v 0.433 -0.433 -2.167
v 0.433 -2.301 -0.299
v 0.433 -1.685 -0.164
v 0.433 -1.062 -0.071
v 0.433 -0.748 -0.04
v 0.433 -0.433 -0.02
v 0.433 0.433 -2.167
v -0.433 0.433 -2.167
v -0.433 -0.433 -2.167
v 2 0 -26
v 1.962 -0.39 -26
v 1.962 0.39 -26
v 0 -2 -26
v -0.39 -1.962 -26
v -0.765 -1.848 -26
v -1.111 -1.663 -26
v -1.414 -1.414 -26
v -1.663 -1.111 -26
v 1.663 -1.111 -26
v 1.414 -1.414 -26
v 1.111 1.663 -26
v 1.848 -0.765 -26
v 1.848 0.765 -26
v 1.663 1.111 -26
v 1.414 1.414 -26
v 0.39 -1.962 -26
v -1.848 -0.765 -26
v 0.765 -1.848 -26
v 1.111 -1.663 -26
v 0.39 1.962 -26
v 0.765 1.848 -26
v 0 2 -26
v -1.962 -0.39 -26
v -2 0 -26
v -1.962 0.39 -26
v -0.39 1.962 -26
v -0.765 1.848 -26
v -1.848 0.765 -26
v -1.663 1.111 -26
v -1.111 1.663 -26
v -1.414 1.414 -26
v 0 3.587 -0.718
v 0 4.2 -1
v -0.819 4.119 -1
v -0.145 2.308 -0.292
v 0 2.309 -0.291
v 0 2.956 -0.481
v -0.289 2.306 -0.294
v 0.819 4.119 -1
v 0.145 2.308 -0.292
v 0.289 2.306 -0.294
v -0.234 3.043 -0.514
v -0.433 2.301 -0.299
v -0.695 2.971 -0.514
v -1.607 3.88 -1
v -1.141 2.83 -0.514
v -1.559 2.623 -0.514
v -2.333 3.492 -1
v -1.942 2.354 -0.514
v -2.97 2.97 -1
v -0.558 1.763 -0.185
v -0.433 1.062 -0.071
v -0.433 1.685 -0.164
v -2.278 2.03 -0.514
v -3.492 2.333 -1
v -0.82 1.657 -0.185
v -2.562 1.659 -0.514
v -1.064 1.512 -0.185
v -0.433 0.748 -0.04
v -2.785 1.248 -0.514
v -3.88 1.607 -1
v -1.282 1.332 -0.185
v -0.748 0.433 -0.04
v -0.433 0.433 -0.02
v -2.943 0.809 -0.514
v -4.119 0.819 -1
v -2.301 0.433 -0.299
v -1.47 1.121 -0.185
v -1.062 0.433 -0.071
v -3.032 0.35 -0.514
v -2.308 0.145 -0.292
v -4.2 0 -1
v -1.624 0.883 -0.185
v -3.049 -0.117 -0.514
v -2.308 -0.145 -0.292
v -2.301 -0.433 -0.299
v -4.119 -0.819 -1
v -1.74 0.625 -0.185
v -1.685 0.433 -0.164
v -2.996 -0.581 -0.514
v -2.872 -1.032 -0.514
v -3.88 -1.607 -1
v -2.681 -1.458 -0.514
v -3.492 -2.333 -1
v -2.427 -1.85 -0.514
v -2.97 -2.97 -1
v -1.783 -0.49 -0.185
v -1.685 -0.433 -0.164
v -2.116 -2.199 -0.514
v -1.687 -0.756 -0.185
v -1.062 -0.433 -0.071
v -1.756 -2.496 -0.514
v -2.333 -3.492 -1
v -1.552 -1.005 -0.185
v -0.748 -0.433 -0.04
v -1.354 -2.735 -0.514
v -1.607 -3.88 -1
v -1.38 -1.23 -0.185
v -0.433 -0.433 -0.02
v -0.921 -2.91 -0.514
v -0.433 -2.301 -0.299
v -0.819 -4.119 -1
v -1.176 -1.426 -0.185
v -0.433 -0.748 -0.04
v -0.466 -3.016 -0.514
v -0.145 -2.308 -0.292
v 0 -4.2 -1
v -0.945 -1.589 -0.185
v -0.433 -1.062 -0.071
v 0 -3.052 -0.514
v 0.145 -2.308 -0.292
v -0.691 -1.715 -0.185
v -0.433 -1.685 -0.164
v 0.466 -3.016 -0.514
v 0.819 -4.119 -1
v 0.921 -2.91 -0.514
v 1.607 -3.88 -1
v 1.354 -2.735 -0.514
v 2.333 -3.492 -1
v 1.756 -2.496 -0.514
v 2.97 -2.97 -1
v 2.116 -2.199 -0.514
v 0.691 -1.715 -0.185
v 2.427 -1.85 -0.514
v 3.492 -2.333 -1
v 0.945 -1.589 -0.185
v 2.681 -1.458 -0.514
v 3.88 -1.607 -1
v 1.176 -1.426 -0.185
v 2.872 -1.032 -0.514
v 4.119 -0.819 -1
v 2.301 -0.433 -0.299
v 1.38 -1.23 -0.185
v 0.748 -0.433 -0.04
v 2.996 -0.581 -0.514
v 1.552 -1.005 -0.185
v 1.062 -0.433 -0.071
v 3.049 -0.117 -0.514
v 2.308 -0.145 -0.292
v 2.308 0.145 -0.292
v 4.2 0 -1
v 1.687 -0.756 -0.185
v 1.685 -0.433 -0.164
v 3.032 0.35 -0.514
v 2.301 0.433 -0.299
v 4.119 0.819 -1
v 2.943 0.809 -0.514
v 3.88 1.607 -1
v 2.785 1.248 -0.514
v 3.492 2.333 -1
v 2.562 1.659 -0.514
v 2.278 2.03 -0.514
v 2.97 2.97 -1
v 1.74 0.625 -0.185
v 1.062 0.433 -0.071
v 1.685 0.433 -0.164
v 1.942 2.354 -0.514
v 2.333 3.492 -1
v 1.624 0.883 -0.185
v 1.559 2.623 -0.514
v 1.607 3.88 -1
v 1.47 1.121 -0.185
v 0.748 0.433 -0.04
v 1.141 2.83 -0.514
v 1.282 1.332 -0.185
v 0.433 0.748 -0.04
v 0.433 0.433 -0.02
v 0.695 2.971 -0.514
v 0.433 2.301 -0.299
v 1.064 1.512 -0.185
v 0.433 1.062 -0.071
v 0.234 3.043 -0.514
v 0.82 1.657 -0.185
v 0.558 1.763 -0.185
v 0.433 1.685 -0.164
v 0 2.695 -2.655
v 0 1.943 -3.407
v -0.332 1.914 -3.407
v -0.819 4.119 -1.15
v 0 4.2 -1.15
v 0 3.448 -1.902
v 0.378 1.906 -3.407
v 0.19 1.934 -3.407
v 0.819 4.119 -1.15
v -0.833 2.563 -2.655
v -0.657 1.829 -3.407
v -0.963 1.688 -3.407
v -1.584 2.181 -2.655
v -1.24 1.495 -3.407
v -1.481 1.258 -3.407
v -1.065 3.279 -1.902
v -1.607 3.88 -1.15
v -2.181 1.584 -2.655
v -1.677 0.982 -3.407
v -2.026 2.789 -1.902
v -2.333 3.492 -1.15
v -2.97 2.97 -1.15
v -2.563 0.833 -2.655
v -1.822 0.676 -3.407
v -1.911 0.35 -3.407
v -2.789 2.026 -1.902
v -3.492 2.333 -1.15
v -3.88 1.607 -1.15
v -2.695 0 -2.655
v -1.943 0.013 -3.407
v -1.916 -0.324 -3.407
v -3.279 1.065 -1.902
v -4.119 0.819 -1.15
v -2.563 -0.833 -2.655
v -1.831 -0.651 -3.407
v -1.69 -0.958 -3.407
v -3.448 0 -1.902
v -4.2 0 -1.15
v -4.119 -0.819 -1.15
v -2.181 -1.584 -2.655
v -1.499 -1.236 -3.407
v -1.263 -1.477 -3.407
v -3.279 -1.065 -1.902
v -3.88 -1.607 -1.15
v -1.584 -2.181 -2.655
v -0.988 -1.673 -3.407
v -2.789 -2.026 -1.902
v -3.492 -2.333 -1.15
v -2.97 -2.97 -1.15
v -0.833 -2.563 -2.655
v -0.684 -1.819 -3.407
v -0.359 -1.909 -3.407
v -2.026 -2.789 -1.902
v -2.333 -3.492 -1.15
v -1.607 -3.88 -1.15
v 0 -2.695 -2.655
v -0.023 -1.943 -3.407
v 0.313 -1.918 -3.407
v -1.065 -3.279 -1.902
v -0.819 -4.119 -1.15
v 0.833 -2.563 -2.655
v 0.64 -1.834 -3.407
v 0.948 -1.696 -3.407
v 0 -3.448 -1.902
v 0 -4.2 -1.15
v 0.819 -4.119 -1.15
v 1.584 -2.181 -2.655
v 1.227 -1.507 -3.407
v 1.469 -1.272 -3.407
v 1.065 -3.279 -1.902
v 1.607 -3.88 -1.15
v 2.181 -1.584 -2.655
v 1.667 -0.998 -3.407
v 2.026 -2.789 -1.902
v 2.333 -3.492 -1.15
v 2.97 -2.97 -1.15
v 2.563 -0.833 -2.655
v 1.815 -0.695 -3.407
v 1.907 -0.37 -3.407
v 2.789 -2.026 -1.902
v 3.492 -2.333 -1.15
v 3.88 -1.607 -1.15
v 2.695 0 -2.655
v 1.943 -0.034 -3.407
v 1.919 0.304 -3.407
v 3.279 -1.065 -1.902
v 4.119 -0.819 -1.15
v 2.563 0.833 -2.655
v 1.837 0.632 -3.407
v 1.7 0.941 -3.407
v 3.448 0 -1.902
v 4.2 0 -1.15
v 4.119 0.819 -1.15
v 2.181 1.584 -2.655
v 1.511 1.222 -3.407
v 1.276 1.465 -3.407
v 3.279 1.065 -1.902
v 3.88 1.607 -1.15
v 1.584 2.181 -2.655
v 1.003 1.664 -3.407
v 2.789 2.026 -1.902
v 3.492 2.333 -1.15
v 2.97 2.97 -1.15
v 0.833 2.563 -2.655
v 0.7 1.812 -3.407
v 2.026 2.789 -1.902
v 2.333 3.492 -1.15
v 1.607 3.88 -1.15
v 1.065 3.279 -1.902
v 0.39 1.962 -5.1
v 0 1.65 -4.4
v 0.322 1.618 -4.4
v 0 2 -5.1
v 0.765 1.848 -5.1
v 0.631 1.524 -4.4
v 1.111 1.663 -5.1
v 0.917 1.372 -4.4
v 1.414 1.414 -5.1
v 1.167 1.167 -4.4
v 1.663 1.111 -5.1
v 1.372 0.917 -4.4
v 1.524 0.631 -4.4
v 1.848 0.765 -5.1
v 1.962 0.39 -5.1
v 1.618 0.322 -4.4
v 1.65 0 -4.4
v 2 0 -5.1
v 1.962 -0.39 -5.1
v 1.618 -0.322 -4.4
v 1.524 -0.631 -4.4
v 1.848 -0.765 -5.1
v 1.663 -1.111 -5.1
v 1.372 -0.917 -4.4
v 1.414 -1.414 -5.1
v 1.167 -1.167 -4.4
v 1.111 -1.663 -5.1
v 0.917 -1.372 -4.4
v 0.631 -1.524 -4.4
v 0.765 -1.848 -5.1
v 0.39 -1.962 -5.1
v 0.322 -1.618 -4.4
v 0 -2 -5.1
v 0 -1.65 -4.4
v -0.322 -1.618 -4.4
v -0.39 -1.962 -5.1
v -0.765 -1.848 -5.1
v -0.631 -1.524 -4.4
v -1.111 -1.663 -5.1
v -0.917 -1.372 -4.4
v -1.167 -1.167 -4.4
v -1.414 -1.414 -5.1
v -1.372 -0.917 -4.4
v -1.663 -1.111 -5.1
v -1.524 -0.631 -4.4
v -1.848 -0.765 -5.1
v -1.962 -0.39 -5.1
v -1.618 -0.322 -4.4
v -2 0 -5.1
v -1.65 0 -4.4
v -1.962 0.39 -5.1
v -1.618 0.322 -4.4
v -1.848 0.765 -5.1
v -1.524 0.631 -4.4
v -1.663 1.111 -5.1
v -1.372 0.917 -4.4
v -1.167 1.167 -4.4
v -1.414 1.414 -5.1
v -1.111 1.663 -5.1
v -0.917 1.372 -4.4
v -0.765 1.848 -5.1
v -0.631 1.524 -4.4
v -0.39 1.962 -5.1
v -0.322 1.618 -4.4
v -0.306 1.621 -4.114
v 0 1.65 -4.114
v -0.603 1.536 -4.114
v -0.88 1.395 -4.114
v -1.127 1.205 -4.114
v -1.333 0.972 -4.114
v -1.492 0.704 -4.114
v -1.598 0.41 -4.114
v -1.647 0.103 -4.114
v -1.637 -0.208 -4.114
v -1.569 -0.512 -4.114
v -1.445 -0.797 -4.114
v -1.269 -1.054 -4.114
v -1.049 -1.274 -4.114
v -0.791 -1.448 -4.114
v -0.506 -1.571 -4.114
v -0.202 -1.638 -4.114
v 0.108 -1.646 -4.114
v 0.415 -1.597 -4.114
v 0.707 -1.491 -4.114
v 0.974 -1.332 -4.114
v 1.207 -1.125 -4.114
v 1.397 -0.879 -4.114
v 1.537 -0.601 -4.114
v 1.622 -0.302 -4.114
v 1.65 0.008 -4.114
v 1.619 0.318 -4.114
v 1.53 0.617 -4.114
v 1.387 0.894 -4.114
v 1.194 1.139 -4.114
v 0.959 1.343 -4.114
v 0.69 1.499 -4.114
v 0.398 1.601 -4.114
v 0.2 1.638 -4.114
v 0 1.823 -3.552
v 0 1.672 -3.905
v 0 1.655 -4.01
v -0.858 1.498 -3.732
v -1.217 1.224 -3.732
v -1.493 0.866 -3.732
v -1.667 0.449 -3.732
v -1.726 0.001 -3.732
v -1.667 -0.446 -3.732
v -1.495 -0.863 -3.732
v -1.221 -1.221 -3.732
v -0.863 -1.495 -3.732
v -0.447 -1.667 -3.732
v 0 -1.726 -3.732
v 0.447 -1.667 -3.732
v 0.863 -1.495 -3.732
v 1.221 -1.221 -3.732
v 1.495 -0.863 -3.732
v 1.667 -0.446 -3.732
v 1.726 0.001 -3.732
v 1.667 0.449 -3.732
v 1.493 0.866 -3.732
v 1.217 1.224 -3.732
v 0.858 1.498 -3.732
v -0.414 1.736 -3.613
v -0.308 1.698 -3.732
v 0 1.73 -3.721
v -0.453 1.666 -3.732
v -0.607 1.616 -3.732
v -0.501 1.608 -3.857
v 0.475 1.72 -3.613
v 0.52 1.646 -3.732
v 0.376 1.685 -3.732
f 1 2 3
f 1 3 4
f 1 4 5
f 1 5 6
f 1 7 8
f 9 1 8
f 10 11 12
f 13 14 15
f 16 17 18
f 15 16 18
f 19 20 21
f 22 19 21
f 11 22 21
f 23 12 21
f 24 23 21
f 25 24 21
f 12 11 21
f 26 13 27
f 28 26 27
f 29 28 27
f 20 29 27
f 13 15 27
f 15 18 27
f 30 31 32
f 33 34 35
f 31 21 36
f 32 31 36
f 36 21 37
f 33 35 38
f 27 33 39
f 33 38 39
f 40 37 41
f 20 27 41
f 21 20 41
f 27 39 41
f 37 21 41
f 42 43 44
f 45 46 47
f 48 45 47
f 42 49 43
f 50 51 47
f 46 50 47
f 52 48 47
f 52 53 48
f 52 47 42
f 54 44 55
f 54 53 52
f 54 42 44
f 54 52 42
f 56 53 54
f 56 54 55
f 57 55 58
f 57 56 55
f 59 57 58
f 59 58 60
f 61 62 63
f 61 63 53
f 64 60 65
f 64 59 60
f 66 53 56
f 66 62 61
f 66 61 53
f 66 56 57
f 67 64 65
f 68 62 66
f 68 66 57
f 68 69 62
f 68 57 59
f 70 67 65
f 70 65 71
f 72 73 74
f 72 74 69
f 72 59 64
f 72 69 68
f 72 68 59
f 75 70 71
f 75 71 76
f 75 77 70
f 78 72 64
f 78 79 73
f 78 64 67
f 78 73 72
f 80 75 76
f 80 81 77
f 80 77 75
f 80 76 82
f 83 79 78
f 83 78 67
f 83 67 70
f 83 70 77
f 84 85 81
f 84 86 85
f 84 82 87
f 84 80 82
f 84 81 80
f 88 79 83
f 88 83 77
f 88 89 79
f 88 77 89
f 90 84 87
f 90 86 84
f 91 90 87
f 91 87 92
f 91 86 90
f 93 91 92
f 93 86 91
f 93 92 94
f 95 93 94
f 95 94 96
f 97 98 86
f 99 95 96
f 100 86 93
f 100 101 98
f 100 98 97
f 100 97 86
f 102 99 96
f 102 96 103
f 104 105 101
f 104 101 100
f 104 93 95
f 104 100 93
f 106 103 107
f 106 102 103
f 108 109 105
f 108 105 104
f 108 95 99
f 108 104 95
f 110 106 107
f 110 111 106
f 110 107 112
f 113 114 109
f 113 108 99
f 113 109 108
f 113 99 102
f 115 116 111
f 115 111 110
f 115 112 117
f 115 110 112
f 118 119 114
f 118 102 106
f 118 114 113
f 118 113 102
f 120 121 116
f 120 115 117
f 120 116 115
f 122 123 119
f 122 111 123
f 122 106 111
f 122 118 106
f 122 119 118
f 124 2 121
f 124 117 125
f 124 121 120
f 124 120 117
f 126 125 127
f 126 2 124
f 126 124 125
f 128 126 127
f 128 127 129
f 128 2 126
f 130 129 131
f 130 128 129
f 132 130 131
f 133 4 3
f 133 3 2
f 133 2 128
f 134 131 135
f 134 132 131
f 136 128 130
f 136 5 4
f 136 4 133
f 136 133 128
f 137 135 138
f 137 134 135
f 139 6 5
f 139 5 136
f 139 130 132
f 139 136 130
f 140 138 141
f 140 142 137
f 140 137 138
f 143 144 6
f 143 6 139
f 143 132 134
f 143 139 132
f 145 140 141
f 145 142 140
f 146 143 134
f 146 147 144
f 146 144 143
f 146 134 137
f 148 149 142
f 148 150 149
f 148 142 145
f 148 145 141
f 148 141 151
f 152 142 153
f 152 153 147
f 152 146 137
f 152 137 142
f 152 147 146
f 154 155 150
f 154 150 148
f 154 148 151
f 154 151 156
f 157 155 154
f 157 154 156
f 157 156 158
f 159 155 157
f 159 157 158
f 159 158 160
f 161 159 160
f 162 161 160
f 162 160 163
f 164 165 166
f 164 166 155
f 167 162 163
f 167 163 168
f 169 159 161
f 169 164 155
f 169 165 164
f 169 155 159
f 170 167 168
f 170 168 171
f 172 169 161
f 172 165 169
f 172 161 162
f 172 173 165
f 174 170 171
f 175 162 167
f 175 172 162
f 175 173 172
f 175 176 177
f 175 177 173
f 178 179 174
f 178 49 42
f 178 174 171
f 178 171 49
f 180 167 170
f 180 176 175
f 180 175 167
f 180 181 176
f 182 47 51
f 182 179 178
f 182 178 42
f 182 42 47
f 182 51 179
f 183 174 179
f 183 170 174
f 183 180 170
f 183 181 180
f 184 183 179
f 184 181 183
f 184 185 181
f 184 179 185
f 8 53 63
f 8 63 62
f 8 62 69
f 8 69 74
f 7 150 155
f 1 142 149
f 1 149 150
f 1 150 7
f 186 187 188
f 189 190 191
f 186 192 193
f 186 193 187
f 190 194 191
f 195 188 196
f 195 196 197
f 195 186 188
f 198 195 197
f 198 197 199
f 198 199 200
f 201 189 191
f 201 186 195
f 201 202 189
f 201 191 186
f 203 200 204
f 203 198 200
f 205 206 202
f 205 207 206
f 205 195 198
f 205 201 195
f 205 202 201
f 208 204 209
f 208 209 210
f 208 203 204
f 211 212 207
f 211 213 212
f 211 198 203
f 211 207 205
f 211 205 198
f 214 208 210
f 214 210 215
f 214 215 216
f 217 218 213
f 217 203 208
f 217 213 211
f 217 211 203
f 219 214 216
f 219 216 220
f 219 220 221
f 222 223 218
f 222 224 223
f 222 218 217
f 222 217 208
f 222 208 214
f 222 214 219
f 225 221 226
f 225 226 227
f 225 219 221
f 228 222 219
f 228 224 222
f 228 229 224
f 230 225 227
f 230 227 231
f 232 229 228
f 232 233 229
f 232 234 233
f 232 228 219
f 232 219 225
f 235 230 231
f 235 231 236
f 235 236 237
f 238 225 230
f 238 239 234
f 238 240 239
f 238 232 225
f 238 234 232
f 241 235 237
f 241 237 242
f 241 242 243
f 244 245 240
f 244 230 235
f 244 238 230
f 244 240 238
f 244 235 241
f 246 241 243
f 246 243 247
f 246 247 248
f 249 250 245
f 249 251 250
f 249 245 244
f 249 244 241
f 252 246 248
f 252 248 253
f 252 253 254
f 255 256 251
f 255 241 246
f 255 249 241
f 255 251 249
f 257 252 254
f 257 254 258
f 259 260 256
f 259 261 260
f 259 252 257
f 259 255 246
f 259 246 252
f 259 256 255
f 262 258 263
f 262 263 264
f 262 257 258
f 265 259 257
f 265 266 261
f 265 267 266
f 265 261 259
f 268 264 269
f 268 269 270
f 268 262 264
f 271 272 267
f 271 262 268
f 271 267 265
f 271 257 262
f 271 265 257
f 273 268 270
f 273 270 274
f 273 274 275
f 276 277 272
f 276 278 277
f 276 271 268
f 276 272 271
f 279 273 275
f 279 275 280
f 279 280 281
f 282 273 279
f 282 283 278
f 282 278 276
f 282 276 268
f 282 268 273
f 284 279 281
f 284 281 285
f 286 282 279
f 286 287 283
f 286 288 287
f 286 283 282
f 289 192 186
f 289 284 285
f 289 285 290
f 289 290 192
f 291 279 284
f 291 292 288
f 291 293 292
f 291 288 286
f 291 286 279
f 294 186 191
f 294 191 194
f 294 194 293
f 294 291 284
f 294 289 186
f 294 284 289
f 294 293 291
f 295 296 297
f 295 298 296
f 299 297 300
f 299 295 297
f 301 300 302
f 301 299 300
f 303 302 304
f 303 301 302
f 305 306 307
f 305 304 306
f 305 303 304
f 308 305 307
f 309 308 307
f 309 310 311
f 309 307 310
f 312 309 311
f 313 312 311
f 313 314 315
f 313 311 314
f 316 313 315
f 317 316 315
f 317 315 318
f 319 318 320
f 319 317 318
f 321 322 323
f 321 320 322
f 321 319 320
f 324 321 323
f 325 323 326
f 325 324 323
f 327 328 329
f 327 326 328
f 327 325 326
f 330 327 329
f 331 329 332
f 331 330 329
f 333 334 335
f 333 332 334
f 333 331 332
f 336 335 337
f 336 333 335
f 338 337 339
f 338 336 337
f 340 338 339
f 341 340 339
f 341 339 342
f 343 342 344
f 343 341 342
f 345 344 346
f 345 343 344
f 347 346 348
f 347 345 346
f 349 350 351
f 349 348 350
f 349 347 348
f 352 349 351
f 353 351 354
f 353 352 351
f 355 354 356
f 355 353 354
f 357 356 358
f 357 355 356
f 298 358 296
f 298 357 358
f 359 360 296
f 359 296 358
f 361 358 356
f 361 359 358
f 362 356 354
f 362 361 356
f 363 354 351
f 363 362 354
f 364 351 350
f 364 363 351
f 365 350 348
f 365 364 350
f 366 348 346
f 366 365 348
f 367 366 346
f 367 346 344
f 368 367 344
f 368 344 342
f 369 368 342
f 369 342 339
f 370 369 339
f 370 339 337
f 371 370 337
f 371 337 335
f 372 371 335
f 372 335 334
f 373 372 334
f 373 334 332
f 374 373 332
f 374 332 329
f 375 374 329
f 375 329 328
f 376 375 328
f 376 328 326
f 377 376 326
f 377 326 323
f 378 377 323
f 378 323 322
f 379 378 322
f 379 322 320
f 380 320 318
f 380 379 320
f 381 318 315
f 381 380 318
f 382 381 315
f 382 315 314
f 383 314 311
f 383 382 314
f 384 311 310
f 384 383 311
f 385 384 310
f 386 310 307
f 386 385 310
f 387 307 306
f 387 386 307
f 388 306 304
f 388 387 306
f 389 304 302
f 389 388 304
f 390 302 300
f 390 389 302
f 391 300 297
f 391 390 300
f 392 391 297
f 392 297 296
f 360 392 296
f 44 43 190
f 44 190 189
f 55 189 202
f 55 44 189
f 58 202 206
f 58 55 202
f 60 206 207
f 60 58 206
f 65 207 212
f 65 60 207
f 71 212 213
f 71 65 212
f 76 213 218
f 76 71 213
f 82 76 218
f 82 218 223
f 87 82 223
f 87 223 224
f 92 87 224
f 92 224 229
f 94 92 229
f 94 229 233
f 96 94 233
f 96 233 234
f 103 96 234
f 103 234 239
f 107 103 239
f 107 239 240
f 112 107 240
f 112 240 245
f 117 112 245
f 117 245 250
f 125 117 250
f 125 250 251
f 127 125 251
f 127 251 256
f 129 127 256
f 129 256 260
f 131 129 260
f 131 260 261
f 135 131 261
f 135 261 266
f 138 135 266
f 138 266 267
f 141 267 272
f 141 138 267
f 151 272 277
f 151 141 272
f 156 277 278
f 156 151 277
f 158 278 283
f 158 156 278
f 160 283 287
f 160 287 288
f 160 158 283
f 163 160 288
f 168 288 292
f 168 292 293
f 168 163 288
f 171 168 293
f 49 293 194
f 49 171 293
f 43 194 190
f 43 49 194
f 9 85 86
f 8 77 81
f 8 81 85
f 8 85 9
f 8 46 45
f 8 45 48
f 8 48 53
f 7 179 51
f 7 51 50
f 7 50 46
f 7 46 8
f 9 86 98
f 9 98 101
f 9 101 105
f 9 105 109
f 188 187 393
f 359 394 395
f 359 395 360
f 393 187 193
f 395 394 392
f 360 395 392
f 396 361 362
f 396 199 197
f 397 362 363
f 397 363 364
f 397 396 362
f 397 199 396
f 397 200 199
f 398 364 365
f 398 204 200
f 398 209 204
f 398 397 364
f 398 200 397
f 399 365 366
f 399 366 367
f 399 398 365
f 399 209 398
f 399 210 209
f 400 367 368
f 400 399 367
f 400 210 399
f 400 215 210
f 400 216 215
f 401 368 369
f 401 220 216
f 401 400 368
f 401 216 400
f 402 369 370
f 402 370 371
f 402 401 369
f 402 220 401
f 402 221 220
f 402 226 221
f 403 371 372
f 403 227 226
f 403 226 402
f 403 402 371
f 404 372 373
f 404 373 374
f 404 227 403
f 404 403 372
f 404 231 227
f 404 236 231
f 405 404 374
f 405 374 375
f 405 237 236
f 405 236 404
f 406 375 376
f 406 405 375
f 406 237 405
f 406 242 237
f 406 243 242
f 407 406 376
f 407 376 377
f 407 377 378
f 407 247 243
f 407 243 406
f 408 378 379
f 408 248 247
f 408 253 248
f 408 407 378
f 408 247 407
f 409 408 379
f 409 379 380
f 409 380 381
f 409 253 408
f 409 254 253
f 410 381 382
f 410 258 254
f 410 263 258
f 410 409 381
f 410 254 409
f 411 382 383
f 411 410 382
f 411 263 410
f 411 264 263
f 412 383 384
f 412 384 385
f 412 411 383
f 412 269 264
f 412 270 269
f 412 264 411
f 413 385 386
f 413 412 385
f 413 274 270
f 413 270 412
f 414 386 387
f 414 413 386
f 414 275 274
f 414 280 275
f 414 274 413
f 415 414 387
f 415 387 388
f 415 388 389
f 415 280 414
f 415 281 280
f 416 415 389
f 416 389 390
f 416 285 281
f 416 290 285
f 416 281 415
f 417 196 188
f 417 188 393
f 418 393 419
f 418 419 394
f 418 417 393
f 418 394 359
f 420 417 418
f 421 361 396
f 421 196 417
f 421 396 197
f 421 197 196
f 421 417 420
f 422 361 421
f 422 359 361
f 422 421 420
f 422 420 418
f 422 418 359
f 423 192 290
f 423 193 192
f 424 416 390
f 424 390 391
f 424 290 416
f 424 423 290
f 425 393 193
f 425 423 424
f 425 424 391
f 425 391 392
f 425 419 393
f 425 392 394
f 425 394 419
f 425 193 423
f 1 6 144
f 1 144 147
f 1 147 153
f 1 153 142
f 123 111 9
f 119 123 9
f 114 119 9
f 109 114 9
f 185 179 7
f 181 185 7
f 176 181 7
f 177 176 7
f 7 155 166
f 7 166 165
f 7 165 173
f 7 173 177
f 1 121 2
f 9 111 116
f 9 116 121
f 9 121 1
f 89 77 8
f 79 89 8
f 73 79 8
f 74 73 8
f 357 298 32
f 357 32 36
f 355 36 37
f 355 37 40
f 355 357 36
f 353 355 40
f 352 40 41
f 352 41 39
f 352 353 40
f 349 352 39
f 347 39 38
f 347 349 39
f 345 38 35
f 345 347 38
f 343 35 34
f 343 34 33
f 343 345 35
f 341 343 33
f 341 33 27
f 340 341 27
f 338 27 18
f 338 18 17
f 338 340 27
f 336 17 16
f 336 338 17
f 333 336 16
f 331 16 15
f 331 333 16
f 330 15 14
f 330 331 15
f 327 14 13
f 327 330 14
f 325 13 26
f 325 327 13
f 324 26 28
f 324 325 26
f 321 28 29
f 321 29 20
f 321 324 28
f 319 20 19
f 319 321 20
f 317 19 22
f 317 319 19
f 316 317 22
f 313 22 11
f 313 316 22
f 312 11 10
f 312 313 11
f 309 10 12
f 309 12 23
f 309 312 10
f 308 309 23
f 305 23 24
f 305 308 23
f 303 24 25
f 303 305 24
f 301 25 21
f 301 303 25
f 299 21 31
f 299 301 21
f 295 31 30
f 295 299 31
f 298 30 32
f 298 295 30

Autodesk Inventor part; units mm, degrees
ref_plane "WorkPlane2" through (0, 0, 0) normal (0, 0, 1) x (1, 0, 0)
sketch "Sketch1" plane through (0, 0, 0) normal (1, 0, 0) x (0, 1, 0)
  point P0 (0, 0)
ref_plane "Work Plane2" through (0, 0, -3.7) normal (0, 0, 1) x (1, 0, 0)
ref_plane "WorkPlane3" through (0, 0, 7) normal (0, 0, 1) x (1, 0, 0)
sketch "Sketch2" plane through (0, 0, 0) normal (0, 1, 0) x (-1, 0, 0)
  point P0 (0, 0)
sketch "Sketch3" plane through (0, 0, 0) normal (1, 0, 0) x (0, 1, 0)
  line L0 (2, -5.1) -> (1.65, -4.4)
  line L1 (2, -26) -> (2, -5.1)
  line L2 (0, -26) -> (2, -26)
  line L3 (0, 0) -> (0, -26)
  arc A0 (4.2, -1) -> (0, 0) centre (0, -9.32) ccw
  line L4 (4.2, -1.15) -> (4.2, -1)
  line L5 (1.65, -3.7) -> (4.2, -1.15)
  line L6 (1.65, -4.4) -> (1.65, -3.7)
  line L7 (0, -31.6445) -> (0, 31.6445) construction
  line L8 (0, -31.6445) -> (0, 31.6445)
  line L9 (0, -44.3023) -> (0, 44.3023) projected
  dimension "d2" = 2
  dimension "d4" = 1.65
  dimension "d6" = 0.7
  dimension "d8" = 2.7
  dimension "d10" = 135
  dimension "d12" = 4.2
  dimension "d14" = 0
  dimension "d16" = 1
  dimension "d18" = 25
  dimension "d22" = 20.9
revolve "Revolution1" add sketch "Sketch3" angle 360 about axis through (0, 0, -31.6445) along (0, 0, 1)
fillet "Fillet1" radius 1 1 edges at (0, -1.65, -3.7)
sketch "Sketch4" plane through (0, 0, 0) normal (0, 1, 0) x (-1, 0, 0)
  line L0 (0, 0) -> (-2.6, 0)
  line L1 (0, -2.1667) -> (0, 0)
  line L2 (-2.6, 0) -> (-0.4333, -2.1667)
  line L3 (0, -11.184) -> (0, 1.864) projected
  arc A0 (4.2, -1) -> (-4.2, -1) centre (0, -9.32) ccw projected
  line L4 (0, -2.1667) -> (-0.4333, -2.1667)
  point P0 (0, -2.6)
  dimension "d30" = 45
  dimension "d33" = 5.2
  dimension "d34" = 0.4333
  dimension "d35" = 90
extrude "Extrusion1" cut sketch "Sketch4" along normal mid plane 0.8667
pattern_circular "PolarArray1" count 4 over 360 about axis through (0, 0, -10) along (0, 0, 1) of "Extrusion1"
thread "Thread1" size "M4x0.7" class "6g" standard "ISO Metric profile" full length
ref_plane "MSC_PF1" through (0, 0, 0) normal (1, 0, 0) x (0, 1, 0)
ref_plane "MSC_PT1" through (0, 4.2, -1.15) normal (0, 0, -1) x (-1, 0, 0)
equation "\"d2\" = 0.5 * NND"
equation "\"d4\" = 0.5 * msp_mdtds"
equation "\"d6\" = msp_x"
equation "\"d8\" = ParK"
equation "\"d12\" = 0.5 * Dk"
equation "\"d16\" = ParF"
equation "\"d18\" = NLG"
equation "\"d22\" = b"
equation "\"d24\" = r"
equation "\"d33\" = M"
equation "\"d34\" = 0.0833333 * M"
equation "\"d31\" = 0.166667 * M"
equation "\"d39\" = b"
equation "\"PTC\" = 0.7"
equation "\"msp_x\" = PTC"
equation "\"NLG\" = 25"
equation "\"NND\" = 4"
equation "\"ParK\" = 2.7"
equation "\"r\" = 1"
equation "\"msp_mdtds\" = NND - PTC"
equation "\"b\" = 20.9"
equation "\"Dk\" = 8.4"
equation "\"ParF\" = 1"
equation "\"M\" = 5.2"
equation "\"ParA\" = 1.4"
equation "\"THREADDIA\" = NND"
equation "\"TEMPLATE\" = 1.2345"
properties part number "ISO 7047 - M4x25 - 4.8 - H" material "Steel"
